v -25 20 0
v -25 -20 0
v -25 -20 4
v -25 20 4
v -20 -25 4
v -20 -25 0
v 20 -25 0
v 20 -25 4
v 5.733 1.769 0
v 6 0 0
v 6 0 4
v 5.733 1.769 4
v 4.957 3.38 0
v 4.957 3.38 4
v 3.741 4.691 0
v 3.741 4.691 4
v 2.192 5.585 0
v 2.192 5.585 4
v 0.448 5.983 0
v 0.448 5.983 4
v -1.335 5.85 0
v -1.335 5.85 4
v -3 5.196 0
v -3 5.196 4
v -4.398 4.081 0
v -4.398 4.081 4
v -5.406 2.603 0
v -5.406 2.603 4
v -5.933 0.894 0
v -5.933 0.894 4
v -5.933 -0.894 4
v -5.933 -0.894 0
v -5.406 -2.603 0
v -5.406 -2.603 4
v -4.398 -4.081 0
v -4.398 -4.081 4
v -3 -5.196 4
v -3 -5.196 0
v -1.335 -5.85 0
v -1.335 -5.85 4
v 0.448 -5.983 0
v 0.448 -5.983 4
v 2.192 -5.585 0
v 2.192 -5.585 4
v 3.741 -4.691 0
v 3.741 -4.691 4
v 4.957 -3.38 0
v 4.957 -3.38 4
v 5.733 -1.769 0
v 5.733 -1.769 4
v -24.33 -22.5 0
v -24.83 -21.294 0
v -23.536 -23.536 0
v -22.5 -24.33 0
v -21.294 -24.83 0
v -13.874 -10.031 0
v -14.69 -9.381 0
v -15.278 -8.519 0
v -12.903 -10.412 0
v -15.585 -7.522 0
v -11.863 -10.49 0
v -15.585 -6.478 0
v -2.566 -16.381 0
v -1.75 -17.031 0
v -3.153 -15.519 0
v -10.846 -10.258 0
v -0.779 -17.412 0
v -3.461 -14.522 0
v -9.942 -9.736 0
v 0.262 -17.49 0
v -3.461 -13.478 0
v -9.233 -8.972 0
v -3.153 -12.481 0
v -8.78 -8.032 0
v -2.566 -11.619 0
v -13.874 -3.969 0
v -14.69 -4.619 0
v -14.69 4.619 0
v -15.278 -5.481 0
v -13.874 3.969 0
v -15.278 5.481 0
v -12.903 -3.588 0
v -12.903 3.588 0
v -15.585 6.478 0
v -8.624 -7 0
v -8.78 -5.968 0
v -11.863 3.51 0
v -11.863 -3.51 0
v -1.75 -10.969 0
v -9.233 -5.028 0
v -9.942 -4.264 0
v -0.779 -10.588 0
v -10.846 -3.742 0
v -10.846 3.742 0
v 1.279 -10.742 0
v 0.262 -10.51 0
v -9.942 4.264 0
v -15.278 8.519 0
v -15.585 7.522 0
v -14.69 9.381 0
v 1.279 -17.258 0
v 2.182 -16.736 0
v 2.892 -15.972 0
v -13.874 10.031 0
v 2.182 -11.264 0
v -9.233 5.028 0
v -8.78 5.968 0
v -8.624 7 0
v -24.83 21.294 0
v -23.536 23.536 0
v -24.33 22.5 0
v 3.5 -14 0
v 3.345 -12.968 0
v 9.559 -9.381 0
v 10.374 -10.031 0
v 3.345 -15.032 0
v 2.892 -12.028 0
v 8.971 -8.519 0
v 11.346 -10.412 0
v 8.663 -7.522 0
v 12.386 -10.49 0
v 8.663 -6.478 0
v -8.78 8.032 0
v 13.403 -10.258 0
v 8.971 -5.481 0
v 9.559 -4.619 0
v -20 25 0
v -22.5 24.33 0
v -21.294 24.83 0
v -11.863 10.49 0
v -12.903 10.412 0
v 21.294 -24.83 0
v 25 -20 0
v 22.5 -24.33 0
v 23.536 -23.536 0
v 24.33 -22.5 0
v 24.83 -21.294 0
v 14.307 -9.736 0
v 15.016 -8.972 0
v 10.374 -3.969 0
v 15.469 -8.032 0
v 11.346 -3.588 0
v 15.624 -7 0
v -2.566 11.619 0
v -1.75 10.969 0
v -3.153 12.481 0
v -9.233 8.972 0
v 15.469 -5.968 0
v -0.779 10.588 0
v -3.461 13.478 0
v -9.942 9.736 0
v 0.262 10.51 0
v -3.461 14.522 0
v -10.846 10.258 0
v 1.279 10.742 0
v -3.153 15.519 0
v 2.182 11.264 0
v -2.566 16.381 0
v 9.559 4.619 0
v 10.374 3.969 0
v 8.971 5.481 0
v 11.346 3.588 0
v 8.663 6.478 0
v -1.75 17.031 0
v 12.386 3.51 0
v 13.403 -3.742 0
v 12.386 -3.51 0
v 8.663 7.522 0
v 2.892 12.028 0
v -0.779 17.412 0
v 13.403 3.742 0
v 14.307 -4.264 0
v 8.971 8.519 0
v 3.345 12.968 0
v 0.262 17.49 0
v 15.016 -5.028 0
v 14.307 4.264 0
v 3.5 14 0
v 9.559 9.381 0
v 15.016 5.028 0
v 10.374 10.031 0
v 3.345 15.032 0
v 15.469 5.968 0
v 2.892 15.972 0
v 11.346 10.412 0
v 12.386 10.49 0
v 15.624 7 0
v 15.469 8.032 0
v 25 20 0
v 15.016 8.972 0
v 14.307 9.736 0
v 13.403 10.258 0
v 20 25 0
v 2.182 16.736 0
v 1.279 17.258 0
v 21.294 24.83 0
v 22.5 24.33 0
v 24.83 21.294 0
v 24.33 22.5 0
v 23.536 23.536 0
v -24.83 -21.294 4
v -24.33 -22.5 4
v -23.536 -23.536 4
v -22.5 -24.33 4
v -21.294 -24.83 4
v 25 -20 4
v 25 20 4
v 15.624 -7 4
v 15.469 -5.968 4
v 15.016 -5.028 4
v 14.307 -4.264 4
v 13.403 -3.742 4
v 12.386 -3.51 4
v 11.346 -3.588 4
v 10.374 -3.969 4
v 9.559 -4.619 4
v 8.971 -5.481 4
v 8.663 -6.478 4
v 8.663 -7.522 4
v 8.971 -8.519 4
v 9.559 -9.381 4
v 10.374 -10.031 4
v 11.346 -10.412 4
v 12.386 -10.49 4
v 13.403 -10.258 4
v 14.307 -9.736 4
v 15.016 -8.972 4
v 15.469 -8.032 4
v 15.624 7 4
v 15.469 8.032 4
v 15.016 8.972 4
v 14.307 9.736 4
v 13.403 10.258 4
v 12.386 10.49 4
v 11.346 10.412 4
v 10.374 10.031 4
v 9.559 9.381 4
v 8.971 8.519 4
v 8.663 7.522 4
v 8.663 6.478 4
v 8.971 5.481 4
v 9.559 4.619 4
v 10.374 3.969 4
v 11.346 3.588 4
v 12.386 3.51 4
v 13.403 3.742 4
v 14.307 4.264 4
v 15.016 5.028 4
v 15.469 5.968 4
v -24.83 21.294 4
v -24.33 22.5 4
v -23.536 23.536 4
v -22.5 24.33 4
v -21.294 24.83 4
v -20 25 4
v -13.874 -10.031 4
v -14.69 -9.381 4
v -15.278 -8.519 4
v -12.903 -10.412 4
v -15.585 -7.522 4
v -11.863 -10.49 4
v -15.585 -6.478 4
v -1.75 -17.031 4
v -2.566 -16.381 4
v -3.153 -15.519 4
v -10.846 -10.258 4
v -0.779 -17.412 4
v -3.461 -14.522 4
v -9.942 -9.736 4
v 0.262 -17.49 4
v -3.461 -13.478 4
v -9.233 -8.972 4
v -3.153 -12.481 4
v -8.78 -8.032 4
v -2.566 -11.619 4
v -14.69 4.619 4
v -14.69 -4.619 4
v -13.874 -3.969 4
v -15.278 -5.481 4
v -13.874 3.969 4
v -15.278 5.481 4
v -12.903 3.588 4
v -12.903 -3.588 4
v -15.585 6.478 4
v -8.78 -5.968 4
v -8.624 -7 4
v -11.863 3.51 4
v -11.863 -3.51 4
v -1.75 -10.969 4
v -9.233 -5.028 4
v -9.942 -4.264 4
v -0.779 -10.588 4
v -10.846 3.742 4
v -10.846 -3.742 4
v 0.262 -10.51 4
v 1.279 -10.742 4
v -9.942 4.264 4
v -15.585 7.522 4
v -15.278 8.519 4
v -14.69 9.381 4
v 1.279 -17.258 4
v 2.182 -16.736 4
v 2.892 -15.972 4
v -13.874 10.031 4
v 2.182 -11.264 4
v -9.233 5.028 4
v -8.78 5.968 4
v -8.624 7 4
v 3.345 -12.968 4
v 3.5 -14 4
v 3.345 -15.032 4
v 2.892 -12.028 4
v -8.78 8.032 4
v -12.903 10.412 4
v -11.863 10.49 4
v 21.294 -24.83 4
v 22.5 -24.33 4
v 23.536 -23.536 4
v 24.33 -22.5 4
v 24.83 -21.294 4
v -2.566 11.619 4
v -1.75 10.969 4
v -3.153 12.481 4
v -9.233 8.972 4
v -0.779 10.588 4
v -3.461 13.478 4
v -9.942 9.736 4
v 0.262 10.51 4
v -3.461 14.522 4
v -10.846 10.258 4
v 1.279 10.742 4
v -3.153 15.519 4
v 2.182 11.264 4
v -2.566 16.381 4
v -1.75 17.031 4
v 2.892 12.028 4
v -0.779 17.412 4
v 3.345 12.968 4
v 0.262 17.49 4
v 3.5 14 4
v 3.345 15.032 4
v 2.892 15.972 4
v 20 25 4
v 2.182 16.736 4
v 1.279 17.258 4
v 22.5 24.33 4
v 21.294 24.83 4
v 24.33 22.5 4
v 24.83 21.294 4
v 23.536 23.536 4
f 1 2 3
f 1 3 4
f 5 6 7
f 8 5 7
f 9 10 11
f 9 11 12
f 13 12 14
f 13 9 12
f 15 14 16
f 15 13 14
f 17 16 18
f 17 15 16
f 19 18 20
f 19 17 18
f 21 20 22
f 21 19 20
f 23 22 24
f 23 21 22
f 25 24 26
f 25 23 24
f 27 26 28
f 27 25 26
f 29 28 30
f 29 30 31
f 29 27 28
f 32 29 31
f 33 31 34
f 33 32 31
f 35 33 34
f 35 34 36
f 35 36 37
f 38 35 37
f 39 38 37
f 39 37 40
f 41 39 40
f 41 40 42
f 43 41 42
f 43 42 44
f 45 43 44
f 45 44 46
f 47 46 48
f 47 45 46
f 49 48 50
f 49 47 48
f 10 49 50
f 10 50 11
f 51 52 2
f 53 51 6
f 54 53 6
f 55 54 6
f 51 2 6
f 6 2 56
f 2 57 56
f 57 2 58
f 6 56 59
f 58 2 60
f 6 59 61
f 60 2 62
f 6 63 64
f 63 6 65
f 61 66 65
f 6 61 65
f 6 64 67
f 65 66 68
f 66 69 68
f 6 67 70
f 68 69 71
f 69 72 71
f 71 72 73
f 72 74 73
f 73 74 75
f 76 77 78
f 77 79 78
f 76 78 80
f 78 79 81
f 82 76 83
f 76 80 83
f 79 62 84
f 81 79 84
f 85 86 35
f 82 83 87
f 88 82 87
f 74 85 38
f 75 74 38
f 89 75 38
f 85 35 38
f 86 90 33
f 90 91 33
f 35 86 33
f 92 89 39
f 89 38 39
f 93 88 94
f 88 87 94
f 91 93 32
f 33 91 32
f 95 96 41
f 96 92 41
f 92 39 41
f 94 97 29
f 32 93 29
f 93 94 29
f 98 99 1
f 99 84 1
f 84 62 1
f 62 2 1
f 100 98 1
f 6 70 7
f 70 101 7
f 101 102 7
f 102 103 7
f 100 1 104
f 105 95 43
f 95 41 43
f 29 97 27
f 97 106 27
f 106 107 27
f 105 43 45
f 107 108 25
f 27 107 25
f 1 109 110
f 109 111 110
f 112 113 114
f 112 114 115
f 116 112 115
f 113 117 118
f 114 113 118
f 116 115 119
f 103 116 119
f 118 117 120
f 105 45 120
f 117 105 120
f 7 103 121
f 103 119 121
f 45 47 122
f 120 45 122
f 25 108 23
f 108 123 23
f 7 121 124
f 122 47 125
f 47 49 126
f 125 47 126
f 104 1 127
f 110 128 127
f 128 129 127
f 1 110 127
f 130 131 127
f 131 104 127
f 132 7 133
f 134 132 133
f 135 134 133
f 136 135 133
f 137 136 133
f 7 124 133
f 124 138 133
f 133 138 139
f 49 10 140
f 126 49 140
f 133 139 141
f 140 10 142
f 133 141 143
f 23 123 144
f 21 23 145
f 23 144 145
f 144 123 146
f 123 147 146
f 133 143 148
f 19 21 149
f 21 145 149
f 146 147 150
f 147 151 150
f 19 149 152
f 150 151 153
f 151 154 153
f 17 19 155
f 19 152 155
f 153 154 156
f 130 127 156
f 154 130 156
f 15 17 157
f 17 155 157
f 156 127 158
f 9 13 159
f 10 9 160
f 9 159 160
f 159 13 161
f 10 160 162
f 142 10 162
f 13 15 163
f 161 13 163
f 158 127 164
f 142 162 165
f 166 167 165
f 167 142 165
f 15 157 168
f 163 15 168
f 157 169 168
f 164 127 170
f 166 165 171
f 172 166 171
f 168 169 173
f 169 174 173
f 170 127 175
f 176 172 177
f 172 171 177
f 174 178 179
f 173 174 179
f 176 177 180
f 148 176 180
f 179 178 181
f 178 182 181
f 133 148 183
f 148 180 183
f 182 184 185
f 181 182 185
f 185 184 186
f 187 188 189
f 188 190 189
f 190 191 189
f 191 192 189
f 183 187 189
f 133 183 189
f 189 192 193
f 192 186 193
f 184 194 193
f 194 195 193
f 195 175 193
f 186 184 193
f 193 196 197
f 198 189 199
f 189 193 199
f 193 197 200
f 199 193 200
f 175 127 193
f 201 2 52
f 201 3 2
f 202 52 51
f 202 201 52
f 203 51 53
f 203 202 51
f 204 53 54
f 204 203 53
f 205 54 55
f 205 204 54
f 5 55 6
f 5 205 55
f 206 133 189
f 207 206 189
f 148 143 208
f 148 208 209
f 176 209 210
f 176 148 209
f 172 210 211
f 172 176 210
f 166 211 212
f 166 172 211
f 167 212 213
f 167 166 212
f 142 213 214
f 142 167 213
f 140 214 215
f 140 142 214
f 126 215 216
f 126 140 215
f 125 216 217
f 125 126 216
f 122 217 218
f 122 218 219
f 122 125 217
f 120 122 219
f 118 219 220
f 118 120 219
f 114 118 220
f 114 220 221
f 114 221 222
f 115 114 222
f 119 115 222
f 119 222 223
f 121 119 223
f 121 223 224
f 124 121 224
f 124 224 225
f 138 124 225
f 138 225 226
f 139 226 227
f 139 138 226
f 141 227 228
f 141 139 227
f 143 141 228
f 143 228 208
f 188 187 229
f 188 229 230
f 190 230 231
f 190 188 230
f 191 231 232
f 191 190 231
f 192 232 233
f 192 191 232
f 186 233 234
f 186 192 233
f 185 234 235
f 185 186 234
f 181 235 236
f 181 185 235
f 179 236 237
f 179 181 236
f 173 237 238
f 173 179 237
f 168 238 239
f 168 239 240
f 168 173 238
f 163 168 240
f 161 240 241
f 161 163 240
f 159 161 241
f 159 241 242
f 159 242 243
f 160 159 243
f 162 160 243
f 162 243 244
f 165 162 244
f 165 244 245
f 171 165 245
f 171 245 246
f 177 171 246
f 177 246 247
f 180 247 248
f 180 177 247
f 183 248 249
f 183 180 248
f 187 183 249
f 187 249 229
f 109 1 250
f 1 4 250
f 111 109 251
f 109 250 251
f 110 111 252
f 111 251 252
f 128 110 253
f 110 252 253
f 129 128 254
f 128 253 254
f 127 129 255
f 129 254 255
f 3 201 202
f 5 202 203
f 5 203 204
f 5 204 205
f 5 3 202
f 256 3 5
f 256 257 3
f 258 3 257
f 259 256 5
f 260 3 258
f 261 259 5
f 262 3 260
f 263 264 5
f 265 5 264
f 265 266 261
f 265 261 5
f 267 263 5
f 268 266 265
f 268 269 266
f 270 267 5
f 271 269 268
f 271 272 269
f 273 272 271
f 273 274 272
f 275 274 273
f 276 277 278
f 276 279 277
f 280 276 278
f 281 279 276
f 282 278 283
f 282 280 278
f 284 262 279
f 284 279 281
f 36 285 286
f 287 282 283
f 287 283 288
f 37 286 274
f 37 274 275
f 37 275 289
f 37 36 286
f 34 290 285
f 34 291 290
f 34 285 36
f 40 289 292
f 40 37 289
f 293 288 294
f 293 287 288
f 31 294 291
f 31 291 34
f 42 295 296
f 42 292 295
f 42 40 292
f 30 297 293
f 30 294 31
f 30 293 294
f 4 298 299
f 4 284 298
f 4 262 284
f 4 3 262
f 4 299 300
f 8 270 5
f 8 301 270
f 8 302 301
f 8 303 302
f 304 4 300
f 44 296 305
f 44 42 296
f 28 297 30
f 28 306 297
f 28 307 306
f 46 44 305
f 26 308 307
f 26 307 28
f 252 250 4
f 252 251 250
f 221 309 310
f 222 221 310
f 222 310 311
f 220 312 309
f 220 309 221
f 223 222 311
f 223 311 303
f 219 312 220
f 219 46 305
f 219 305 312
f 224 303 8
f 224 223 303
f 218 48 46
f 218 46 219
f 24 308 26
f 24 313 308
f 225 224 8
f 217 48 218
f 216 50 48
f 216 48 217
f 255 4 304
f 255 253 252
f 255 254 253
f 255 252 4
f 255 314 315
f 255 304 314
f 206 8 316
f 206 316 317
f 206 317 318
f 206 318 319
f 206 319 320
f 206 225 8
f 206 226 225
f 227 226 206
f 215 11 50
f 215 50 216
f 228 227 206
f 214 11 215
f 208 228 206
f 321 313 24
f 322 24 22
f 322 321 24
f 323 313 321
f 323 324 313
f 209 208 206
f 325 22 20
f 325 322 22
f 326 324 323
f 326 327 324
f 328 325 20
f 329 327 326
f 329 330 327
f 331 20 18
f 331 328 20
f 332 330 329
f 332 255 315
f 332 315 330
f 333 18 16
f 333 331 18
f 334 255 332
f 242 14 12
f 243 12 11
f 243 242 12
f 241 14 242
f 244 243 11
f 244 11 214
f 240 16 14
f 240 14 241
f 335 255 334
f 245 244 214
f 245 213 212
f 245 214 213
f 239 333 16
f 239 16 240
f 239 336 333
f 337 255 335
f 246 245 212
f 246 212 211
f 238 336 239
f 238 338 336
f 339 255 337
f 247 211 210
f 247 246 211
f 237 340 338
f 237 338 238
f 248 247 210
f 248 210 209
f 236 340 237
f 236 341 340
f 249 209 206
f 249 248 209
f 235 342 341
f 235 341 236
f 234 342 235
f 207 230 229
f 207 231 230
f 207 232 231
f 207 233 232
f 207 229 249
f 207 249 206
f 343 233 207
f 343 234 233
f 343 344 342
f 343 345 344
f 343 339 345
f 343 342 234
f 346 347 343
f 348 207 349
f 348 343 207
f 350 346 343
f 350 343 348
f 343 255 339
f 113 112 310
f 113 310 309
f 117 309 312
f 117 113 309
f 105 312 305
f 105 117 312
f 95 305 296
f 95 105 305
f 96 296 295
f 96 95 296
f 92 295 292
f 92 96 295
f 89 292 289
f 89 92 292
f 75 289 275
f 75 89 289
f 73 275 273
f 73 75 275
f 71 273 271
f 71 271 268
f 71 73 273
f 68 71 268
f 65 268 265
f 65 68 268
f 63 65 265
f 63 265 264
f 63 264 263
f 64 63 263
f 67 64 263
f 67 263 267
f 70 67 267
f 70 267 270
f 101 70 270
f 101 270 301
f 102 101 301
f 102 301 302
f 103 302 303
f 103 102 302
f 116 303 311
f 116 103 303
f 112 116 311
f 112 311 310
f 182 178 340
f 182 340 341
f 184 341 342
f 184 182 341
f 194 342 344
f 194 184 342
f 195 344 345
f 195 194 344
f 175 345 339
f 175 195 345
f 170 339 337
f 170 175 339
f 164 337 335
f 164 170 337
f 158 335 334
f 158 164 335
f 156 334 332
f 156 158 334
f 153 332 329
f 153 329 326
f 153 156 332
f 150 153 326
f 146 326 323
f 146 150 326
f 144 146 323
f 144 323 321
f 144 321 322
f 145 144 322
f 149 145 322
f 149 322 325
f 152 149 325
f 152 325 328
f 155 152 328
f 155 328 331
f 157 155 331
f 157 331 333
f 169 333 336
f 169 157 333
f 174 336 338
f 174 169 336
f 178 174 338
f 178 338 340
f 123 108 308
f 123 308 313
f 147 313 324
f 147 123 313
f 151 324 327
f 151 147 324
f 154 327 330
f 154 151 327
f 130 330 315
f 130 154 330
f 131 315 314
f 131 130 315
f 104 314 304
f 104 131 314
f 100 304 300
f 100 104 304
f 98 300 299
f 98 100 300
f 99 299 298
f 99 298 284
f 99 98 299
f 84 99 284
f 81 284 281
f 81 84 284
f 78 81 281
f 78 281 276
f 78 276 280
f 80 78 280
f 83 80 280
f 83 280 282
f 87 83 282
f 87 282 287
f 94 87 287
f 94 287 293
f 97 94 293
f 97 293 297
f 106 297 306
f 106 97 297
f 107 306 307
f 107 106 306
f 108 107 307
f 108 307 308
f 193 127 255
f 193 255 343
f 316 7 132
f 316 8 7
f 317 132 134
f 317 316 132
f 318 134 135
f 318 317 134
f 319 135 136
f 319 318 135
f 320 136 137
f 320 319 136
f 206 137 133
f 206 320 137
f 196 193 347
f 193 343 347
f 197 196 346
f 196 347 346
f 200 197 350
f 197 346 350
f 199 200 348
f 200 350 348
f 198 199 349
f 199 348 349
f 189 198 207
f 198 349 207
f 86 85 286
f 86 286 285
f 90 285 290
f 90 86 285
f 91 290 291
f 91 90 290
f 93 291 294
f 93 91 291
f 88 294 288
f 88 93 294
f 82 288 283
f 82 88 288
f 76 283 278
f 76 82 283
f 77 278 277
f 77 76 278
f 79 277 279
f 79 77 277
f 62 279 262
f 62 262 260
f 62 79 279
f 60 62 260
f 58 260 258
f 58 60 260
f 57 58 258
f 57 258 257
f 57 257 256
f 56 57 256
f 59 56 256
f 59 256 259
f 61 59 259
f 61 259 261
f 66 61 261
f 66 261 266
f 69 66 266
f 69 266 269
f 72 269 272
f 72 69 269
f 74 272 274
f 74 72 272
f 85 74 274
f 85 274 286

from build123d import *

# Parameters (mm, degrees)
SKETCH_1_W      = 50
SKETCH_1_H      = 50
SKETCH_1_R      = 3.5
SKETCH_1_R_2    = 6
EXTRUDE_1_DEPTH = 4
FILLET_1_R      = 5


with BuildPart() as part:
    # 草图1 → 凸台-拉伸1 (new body)
    with BuildSketch(Plane.XY):
        Rectangle(SKETCH_1_W, SKETCH_1_H)
        with Locations((0, 14)):
            Circle(SKETCH_1_R, mode=Mode.SUBTRACT)
        with Locations((12.124355653, 7)):
            Circle(SKETCH_1_R, mode=Mode.SUBTRACT)
        with Locations((12.124355653, -7)):
            Circle(SKETCH_1_R, mode=Mode.SUBTRACT)
        with Locations((0, -14)):
            Circle(SKETCH_1_R, mode=Mode.SUBTRACT)
        with Locations((-12.124355653, -7)):
            Circle(SKETCH_1_R, mode=Mode.SUBTRACT)
        with Locations((-12.124355653, 7)):
            Circle(SKETCH_1_R, mode=Mode.SUBTRACT)
        Circle(SKETCH_1_R_2, mode=Mode.SUBTRACT)
    extrude(amount=EXTRUDE_1_DEPTH)

    # 圆角1
    fillet_1_edges = [part.edges().sort_by_distance(p)[0] for p in [
        (-25, 25, 2),
        (25, 25, 2),
        (25, -25, 2),
        (-25, -25, 2),
    ]]
    fillet(fillet_1_edges, radius=FILLET_1_R)


solid = part.part
